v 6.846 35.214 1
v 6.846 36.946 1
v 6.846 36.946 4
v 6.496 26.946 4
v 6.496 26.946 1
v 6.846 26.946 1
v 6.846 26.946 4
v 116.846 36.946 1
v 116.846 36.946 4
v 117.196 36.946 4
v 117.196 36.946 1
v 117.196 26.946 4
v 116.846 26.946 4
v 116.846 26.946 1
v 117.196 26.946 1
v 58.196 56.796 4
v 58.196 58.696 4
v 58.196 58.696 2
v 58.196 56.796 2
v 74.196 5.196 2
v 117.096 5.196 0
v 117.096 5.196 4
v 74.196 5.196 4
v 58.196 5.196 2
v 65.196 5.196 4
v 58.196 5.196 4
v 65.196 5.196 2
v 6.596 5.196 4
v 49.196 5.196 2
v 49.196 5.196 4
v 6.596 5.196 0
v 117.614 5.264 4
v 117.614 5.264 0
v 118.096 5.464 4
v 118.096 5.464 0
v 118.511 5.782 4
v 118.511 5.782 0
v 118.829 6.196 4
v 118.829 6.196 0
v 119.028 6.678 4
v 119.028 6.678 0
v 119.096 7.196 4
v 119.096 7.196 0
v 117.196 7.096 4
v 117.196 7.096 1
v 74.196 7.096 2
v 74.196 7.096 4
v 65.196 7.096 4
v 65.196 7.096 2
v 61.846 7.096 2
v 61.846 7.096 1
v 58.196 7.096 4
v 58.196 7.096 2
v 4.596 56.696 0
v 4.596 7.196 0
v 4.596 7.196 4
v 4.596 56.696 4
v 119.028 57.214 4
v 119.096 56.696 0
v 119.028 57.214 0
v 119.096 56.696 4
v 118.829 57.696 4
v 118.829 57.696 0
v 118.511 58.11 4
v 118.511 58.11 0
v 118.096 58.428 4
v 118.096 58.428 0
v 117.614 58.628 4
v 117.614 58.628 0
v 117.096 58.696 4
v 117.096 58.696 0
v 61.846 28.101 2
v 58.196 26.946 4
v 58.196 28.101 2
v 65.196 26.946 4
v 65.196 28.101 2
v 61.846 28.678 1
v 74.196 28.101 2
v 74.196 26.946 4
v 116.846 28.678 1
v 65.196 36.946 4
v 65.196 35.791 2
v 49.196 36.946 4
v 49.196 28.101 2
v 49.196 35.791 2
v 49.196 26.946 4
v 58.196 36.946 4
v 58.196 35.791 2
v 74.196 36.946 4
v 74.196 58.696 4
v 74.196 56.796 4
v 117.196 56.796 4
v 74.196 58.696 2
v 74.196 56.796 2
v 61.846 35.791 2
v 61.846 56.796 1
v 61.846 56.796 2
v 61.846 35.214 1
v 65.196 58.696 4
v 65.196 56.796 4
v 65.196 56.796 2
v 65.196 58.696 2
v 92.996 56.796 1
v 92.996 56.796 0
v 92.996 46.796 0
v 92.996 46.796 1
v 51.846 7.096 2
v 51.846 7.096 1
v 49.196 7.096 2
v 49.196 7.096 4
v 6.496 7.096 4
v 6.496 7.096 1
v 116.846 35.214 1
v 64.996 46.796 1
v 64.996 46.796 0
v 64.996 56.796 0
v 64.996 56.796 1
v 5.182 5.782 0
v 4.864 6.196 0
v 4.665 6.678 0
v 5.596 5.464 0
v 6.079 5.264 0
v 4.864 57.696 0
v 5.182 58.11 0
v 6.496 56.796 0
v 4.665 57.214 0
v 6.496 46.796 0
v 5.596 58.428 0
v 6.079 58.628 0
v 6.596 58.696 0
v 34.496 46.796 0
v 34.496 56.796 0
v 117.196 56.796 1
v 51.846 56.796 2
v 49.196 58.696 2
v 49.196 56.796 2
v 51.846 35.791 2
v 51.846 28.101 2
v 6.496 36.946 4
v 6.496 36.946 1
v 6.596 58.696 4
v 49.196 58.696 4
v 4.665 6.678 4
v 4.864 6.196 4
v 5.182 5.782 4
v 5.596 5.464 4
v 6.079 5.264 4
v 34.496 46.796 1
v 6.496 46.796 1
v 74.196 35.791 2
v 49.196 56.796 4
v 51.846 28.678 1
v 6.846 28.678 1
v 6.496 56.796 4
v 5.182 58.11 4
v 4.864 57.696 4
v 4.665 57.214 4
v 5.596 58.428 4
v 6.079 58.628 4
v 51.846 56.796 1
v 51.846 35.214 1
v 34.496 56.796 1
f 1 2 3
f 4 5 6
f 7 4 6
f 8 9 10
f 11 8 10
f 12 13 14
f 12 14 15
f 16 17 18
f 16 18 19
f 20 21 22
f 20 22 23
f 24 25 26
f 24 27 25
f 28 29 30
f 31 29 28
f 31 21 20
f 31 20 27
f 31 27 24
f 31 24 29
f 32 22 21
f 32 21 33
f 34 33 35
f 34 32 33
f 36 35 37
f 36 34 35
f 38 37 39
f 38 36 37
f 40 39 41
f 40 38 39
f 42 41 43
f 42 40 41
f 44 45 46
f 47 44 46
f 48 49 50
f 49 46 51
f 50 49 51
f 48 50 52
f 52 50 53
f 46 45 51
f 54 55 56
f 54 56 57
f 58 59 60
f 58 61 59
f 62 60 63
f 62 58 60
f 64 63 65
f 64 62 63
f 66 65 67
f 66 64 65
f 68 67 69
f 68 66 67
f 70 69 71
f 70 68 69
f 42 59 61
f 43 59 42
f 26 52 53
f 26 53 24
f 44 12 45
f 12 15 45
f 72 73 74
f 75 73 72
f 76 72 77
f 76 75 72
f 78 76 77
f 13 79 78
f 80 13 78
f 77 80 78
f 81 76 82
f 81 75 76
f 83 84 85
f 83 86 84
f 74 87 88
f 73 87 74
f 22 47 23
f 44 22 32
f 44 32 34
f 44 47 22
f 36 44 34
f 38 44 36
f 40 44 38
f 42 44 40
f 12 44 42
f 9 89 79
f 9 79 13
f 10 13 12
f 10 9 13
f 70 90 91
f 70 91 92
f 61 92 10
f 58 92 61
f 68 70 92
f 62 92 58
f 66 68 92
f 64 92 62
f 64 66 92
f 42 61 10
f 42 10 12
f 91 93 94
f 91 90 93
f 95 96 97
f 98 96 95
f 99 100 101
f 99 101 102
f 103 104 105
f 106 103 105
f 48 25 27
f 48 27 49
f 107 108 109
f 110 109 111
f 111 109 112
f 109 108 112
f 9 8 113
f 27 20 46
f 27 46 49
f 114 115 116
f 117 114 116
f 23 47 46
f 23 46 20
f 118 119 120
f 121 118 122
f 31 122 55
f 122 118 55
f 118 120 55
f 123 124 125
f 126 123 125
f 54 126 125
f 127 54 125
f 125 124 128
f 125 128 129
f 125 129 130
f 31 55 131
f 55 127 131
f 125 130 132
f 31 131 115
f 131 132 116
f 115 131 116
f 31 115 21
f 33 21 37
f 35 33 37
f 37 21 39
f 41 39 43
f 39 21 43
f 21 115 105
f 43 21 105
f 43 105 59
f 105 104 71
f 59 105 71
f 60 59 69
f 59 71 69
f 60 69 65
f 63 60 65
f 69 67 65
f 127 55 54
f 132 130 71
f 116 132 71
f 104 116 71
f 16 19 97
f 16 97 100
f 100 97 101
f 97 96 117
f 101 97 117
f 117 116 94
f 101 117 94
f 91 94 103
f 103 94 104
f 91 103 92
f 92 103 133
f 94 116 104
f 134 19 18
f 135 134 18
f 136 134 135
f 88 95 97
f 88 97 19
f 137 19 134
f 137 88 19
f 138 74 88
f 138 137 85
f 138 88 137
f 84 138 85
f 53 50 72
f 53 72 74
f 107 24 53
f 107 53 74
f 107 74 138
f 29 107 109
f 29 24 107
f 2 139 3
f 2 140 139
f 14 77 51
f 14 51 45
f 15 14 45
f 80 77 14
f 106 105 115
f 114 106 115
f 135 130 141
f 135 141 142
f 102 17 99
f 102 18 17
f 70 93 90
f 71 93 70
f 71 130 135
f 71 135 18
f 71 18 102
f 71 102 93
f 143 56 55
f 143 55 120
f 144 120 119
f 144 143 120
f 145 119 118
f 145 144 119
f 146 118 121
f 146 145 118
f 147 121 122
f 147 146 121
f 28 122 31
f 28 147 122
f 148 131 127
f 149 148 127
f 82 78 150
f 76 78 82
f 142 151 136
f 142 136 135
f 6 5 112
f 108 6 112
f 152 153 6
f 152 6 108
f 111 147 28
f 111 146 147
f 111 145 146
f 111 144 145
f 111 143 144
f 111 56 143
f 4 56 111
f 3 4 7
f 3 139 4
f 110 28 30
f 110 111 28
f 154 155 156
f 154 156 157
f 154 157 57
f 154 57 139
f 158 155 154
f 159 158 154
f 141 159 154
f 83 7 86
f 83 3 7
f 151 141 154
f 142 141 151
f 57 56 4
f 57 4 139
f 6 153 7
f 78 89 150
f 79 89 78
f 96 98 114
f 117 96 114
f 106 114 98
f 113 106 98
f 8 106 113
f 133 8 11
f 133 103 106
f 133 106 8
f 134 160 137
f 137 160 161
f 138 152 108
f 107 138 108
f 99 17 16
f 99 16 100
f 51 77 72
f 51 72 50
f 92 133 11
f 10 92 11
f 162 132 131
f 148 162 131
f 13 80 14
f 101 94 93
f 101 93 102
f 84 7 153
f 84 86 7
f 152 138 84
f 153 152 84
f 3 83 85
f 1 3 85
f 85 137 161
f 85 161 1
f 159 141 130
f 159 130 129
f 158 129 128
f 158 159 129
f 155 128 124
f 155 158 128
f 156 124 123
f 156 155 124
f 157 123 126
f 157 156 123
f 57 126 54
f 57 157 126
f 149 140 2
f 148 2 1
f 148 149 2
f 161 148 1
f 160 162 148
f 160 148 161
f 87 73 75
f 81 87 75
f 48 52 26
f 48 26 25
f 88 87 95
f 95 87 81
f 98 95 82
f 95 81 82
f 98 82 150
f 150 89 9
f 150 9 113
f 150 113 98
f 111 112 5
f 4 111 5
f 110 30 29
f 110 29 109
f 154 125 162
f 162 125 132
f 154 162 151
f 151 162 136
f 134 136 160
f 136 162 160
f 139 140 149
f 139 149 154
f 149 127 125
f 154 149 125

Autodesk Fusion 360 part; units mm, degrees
sketch "Schizzo1" plane through (0, 0, 0) normal (0, 0, 1) x (1, 0, 0)
  line L0 (4.4965, 58.7959) -> (119.1965, 58.7959) construction
  line L1 (119.1965, 58.7959) -> (119.1965, 5.0959) construction
  line L2 (119.1965, 5.0959) -> (4.4965, 5.0959) construction
  line L3 (4.4965, 5.0959) -> (4.4965, 58.7959) construction
  line L4 (4.4965, 31.9459) -> (119.1965, 31.9459) construction
  line L5 (61.8465, 58.7959) -> (61.8465, 5.0959) construction
  line L6 (119.0965, 5.1959) -> (4.5965, 5.1959)
  line L7 (4.5965, 5.1959) -> (4.5965, 58.6959)
  line L8 (4.5965, 58.6959) -> (119.0965, 58.6959)
  line L9 (119.0965, 58.6959) -> (119.0965, 5.1959)
  line L10 (117.1965, 7.0959) -> (6.4965, 7.0959)
  line L11 (6.4965, 7.0959) -> (6.4965, 56.7959)
  line L12 (6.4965, 56.7959) -> (117.1965, 56.7959)
  line L13 (117.1965, 56.7959) -> (117.1965, 7.0959)
  line L14 (6.4965, 56.7959) -> (34.4965, 56.7959)
  line L15 (34.4965, 56.7959) -> (34.4965, 46.7959)
  line L16 (34.4965, 46.7959) -> (6.4965, 46.7959)
  line L17 (6.4965, 46.7959) -> (6.4965, 56.7959)
  line L18 (92.9965, 56.7959) -> (92.9965, 46.7959)
  line L19 (92.9965, 46.7959) -> (64.9965, 46.7959)
  line L20 (64.9965, 46.7959) -> (64.9965, 56.7959)
  line L21 (64.9965, 56.7959) -> (92.9965, 56.7959)
  line L22 (4.4965, 36.9459) -> (119.0965, 36.9459)
  line L23 (4.4965, 26.9459) -> (119.0965, 26.9459)
  line L24 (51.8465, 58.7959) -> (51.8465, 5.0959)
  line L25 (61.8465, 58.7959) -> (61.8465, 5.0959)
  dimension "d1" = 114.7
  dimension "d2" = 53.7
  dimension "d3" = 0.1
  dimension "d6" = 2
  dimension "d7" = 28
  dimension "d8" = 10
  dimension "d11" = 58.5
  dimension "d12" = 0
  dimension "d15" = 10
  dimension "d23" = 10
extrude "Estrusione1" add sketch "Schizzo1" along normal blind 1 contours L10 L13 L23 L25 | L10 L23 L24 L25 | L13 L22 L23 L25 | L10 L11 L23 L24 | L22 L23 L24 L25 | L12 L13 L18 L19 L20 L22 L25 | L11 L22 L23 L24 | L12 L22 L24 L25 | L11 L12 L15 L16 L22 L24
extrude "Estrusione2" add sketch "Schizzo1" along normal blind 4 contours L6 L9 L10 L13 L23 L25 | L6 L10 L24 L25 | L9 L13 L22 L23 | L6 L7 L10 L11 L23 L24 | L8 L9 L12 L13 L21 L22 L25 | L13 L22 L23 L25 | L22 L23 L24 L25 | L7 L11 L22 L23 | L11 L22 L23 L24 | L8 L12 L24 L25 | L7 L8 L11 L12 L14 L17 L22 L24
fillet "Raccordo1" radius 2 4 edges at (4.5965, 5.1959, 2) (119.0965, 5.1959, 2) (119.0965, 58.6959, 2) (4.5965, 58.6959, 2)
ref_plane "Piano di lavoro1" through (61.8465, 31.9459, 0) normal (-1, 0, 0) x (0, -1, 0)
sketch "Schizzo3" plane through (61.8465, 0, 0) normal (-1, 0, 0) x (0, -1, 0)
  line L0 (-26.9459, 4) -> (-36.9459, 4) construction
  line L1 (-36.9459, 4) -> (-36.9459, 0) construction
  line L2 (-36.9459, 0) -> (-26.9459, 0) construction
  line L3 (-26.9459, 0) -> (-26.9459, 4) construction
  line L4 (-56.6959, 4) -> (-7.1959, 4) construction
  line L5 (-58.7959, 0) -> (-5.0959, 0) construction
  line L6 (-26.9459, 1) -> (-26.9459, 4) construction
  line L7 (-36.9459, 1) -> (-36.9459, 4) construction
  line L8 (-31.9459, 4) -> (-31.9459, 0) construction
  line L9 (-26.9459, 1) -> (-36.9459, 1) construction
  line L10 (-26.9459, 1) -> (-26.9459, 4)
  line L11 (-26.9459, 4) -> (-28.678, 1)
  line L12 (-28.678, 1) -> (-26.9459, 1)
  line L13 (-36.9459, 1) -> (-36.9459, 4)
  line L14 (-36.9459, 4) -> (-35.2139, 1)
  line L15 (-35.2139, 1) -> (-36.9459, 1)
  dimension "d20" = 30
extrude "Estrusione4" cut sketch "Schizzo3" along normal mid plane 110
extrude "Estrusione5" add sketch "Schizzo1" along normal blind 2 contours L6 L10 L24 L25 | L10 L23 L24 L25 | L22 L23 L24 L25 | L12 L22 L24 L25 | L8 L12 L24 L25
sketch "Schizzo4" plane through (0, 0, 4) normal (0, 0, 1) x (-1, 0, 0)
  arc A0 (-6.5965, -58.6959) -> (-4.5965, -56.6959) centre (-6.5965, -56.6959) ccw
  line L0 (-4.5965, -56.6959) -> (-4.5965, -7.1959)
  arc A1 (-4.5965, -7.1959) -> (-6.5965, -5.1959) centre (-6.5965, -7.1959) ccw
  line L1 (-6.5965, -5.1959) -> (-117.0965, -5.1959)
  arc A2 (-117.0965, -5.1959) -> (-119.0965, -7.1959) centre (-117.0965, -7.1959) ccw
  line L2 (-119.0965, -7.1959) -> (-119.0965, -56.6959)
  arc A3 (-119.0965, -56.6959) -> (-117.0965, -58.6959) centre (-117.0965, -56.6959) ccw
  line L3 (-117.0965, -58.6959) -> (-6.5965, -58.6959)
  line L4 (-117.1965, -36.9459) -> (-116.8465, -36.9459)
  line L5 (-116.8465, -36.9459) -> (-6.8465, -36.9459)
  line L6 (-6.8465, -36.9459) -> (-6.4965, -36.9459)
  line L7 (-6.4965, -36.9459) -> (-6.4965, -56.7959)
  line L8 (-6.4965, -56.7959) -> (-117.1965, -56.7959)
  line L9 (-117.1965, -56.7959) -> (-117.1965, -36.9459)
  line L10 (-117.1965, -7.0959) -> (-6.4965, -7.0959)
  line L11 (-6.4965, -7.0959) -> (-6.4965, -26.9459)
  line L12 (-6.4965, -26.9459) -> (-6.8465, -26.9459)
  line L13 (-6.8465, -26.9459) -> (-116.8465, -26.9459)
  line L14 (-116.8465, -26.9459) -> (-117.1965, -26.9459)
  line L15 (-117.1965, -26.9459) -> (-117.1965, -7.0959)
  line L16 (-4.5965, -58.6959) -> (-119.0965, -58.6959) construction
  line L17 (-119.0965, -58.6959) -> (-119.0965, -5.1959) construction
  line L18 (-119.0965, -5.1959) -> (-4.5965, -5.1959) construction
  line L19 (-4.5965, -5.1959) -> (-4.5965, -58.6959) construction
  line L20 (-49.1965, -58.6959) -> (-58.1965, -58.6959)
  line L21 (-58.1965, -58.6959) -> (-58.1965, -5.1959)
  line L22 (-58.1965, -5.1959) -> (-49.1965, -5.1959)
  line L23 (-49.1965, -5.1959) -> (-49.1965, -58.6959)
  line L24 (-65.1965, -58.6959) -> (-74.1965, -58.6959)
  line L25 (-74.1965, -58.6959) -> (-74.1965, -5.1959)
  line L26 (-74.1965, -5.1959) -> (-65.1965, -5.1959)
  line L27 (-65.1965, -5.1959) -> (-65.1965, -58.6959)
  line L28 (-53.6965, -58.6959) -> (-53.6965, -5.1959) construction
  line L29 (-69.6965, -58.6959) -> (-69.6965, -5.1959) construction
  line L30 (-2.6965, -58.6959) -> (-2.6965, -5.1959) construction
  dimension "d28" = 9
  dimension "d29" = 9
  dimension "d33" = 1.9
  dimension "d34" = 51
  dimension "d35" = 67
extrude "Estrusione6" cut sketch "Schizzo4" against normal blind 2 contours L3 L8 L20 L21 L23 | L5 L8 L21 L23 | L3 L8 L24 L25 L27 | L5 L13 L21 L23 | L1 L10 L21 L22 L23 | L5 L8 L25 L27 | L10 L13 L21 L23 | L5 L13 L25 L27 | L1 L10 L25 L26 L27 | L10 L13 L25 L27
